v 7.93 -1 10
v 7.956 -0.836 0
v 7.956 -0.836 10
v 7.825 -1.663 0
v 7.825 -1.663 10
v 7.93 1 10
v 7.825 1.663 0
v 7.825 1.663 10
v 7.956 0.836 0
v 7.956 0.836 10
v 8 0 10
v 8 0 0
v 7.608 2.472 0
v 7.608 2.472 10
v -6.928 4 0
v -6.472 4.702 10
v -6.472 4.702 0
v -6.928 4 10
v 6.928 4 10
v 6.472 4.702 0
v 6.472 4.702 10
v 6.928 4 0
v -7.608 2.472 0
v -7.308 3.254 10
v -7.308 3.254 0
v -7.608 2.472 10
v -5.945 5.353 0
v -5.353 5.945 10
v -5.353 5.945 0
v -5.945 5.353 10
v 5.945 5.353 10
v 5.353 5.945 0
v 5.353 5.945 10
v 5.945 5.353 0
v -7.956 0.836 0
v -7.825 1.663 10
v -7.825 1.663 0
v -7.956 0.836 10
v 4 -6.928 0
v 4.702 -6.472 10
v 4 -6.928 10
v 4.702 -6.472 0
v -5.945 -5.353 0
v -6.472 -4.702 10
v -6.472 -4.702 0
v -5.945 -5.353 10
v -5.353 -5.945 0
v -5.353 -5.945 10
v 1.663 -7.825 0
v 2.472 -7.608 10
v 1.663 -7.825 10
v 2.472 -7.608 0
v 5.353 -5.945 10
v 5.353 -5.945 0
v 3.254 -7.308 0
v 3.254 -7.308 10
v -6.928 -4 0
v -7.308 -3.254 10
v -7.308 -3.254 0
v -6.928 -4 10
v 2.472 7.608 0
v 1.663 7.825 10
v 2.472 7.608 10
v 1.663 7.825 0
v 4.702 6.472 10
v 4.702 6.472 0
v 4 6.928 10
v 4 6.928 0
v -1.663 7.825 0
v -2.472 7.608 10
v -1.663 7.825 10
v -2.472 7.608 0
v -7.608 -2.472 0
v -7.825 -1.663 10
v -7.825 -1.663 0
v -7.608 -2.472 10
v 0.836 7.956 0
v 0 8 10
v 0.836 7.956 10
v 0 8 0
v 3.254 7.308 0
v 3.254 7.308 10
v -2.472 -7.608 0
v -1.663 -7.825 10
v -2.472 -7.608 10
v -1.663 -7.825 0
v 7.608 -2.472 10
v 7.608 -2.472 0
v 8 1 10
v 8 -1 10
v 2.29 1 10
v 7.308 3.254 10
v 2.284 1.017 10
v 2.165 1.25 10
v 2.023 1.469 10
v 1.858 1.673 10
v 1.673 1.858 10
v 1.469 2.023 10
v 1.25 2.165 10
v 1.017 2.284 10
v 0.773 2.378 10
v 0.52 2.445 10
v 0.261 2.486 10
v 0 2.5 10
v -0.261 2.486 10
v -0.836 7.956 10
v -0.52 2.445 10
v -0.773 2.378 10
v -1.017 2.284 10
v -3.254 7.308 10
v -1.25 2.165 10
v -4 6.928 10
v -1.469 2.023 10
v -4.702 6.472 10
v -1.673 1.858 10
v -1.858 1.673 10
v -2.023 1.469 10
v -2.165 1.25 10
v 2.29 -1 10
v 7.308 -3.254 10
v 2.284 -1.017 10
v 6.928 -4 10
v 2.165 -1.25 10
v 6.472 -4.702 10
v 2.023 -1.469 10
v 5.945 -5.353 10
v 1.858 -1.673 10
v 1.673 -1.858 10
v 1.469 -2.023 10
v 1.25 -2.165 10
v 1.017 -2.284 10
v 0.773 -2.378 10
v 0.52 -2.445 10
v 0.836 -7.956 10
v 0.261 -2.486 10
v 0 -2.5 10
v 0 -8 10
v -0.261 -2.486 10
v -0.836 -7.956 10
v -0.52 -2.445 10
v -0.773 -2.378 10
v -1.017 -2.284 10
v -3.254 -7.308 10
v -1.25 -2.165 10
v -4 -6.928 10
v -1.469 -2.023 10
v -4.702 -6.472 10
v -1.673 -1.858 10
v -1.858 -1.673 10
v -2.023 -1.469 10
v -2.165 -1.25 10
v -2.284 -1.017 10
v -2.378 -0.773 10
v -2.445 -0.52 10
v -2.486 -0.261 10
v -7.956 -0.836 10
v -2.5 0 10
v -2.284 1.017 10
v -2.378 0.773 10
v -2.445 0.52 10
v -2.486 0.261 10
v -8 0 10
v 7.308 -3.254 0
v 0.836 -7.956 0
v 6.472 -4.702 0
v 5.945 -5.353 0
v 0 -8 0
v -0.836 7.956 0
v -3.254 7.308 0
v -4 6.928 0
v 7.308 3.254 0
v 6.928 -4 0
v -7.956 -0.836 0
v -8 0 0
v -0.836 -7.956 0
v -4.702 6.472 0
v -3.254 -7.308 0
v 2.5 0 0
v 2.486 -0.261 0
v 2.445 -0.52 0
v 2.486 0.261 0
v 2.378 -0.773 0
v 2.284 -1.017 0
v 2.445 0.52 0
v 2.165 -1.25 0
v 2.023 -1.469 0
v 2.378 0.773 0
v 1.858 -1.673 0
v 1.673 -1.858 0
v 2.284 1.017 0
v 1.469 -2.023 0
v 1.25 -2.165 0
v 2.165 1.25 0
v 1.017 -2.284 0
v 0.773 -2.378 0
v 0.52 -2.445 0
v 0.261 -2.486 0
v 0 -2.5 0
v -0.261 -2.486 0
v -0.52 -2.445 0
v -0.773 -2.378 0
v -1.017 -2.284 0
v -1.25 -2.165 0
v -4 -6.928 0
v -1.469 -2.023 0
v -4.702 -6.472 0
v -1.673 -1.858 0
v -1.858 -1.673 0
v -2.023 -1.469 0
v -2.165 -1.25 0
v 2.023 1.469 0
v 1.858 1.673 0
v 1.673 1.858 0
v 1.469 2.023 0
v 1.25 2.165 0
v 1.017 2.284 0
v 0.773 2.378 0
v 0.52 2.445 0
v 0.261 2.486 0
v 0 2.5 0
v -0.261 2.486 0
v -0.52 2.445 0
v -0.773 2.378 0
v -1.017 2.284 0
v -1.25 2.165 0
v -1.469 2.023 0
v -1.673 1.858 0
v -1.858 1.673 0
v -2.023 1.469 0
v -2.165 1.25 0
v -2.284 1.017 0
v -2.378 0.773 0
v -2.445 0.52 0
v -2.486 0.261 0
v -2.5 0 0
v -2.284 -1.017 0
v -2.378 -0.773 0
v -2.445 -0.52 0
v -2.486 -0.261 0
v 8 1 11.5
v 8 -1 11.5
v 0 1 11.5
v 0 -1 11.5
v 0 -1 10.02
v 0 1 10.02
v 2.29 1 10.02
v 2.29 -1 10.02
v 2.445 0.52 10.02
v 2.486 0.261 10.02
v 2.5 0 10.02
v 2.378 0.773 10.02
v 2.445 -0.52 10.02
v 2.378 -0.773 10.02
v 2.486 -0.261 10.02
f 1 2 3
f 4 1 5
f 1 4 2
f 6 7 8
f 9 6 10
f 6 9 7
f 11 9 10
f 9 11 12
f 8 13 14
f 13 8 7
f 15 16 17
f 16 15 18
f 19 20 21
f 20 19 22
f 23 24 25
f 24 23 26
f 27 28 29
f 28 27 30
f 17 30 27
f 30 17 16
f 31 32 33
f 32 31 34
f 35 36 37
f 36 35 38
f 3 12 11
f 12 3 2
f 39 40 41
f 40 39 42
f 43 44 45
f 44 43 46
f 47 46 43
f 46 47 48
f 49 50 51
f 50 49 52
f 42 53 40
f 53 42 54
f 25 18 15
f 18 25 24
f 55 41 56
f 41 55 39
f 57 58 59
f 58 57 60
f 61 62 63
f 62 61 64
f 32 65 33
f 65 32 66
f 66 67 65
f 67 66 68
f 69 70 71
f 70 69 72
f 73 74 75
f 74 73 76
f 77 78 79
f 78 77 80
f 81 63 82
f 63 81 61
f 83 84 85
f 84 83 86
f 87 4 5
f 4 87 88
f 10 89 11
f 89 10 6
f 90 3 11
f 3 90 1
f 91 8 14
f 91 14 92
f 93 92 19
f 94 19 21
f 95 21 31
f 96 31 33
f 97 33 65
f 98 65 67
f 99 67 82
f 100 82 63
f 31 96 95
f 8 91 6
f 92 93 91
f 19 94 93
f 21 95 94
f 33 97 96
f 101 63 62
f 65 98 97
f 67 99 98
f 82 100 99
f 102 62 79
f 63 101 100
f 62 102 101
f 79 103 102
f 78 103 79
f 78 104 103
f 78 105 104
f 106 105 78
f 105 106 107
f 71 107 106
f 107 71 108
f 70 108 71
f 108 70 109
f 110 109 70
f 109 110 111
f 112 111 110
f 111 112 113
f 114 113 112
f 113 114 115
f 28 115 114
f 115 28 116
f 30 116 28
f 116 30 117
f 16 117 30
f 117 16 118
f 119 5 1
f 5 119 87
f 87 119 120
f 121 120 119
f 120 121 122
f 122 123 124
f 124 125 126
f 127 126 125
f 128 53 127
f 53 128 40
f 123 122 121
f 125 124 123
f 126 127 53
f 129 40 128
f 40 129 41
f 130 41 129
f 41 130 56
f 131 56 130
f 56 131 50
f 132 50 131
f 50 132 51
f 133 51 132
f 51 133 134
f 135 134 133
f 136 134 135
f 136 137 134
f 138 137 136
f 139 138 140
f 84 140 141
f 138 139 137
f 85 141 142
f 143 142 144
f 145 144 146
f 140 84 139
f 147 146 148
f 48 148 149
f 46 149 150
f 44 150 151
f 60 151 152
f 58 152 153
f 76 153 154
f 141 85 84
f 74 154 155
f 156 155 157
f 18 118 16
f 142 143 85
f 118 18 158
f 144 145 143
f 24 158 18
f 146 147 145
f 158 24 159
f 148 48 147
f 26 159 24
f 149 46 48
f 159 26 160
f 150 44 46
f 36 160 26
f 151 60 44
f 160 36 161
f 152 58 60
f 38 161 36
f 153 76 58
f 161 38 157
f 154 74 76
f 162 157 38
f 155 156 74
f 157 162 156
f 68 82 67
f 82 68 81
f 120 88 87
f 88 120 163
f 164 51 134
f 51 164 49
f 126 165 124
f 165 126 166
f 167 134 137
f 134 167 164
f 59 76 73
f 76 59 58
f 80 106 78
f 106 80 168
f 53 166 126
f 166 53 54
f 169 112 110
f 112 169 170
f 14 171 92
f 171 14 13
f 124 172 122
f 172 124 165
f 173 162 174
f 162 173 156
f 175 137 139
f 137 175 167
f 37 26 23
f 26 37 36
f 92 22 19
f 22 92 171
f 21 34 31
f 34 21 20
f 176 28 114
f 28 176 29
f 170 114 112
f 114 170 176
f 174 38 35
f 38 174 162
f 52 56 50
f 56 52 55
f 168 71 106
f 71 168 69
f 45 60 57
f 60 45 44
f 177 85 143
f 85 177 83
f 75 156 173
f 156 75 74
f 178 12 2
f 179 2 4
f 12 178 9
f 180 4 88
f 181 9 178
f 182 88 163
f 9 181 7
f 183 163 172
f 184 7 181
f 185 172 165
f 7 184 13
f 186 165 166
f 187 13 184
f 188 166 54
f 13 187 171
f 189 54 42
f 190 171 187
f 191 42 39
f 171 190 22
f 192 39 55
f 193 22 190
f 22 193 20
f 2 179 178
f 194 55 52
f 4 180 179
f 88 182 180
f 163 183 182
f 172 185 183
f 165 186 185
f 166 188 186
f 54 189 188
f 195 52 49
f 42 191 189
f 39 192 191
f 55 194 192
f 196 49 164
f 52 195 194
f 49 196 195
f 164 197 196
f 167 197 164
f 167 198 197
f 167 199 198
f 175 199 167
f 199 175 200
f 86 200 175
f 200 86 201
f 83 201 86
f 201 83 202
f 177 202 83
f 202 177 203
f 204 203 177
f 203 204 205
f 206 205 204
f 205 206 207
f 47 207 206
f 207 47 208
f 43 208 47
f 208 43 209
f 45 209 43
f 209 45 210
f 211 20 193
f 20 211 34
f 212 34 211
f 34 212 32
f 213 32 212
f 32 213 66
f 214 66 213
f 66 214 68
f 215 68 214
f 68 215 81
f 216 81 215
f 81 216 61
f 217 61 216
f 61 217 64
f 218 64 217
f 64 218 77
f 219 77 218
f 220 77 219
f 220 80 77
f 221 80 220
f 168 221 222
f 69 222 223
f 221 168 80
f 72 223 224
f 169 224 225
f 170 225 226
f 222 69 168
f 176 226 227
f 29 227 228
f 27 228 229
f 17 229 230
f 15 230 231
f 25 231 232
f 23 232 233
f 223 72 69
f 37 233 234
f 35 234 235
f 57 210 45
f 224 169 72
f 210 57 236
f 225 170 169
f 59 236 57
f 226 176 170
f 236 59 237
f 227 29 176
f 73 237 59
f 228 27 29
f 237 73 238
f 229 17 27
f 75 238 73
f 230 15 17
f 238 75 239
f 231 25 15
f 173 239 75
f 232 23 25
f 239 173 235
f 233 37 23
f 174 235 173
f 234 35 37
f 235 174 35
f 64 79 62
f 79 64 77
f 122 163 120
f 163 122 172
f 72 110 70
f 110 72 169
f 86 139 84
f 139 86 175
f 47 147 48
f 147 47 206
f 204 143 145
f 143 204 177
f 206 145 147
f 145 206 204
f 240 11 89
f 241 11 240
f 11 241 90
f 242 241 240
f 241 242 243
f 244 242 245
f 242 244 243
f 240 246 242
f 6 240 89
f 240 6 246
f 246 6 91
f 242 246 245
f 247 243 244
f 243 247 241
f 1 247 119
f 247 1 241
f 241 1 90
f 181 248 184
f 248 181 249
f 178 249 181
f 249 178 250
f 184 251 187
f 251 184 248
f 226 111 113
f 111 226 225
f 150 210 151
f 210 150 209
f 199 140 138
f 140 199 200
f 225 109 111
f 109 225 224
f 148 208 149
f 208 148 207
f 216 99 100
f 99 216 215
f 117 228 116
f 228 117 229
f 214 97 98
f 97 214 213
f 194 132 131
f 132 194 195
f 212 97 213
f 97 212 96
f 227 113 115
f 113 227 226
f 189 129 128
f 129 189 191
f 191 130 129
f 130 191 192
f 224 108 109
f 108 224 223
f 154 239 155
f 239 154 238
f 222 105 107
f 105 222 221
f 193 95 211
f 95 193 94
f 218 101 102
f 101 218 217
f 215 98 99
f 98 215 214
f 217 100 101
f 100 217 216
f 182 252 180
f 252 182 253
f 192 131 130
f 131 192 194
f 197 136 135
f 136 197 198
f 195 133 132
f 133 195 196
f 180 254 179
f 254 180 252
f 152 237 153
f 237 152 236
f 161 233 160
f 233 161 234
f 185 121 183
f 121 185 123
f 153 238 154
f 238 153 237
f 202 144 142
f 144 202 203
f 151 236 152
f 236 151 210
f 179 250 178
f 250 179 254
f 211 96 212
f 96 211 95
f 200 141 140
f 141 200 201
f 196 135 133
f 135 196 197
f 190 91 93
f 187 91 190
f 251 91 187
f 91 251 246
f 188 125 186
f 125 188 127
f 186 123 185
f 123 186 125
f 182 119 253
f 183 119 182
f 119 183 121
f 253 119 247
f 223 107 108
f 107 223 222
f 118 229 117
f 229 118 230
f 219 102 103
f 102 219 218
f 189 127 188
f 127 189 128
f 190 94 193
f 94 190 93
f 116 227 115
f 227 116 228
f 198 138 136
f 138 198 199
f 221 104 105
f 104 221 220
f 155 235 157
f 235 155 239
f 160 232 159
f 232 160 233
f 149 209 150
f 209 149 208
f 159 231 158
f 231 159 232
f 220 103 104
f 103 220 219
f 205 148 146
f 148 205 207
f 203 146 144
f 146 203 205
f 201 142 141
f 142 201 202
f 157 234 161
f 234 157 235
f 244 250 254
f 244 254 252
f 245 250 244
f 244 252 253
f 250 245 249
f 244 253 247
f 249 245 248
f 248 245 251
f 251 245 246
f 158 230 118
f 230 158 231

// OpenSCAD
// Pointer control knob.
$fn = 60;
eps = 0.02;
bore_d = 5;
knob_d = 16;
knob_h = 10;
difference() { union() { cylinder(d=knob_d,h=knob_h); translate([0,-1,knob_h]) cube([knob_d/2,2,1.5]); } translate([0,0,-eps]) cylinder(d=bore_d,h=knob_h+2*eps); }
